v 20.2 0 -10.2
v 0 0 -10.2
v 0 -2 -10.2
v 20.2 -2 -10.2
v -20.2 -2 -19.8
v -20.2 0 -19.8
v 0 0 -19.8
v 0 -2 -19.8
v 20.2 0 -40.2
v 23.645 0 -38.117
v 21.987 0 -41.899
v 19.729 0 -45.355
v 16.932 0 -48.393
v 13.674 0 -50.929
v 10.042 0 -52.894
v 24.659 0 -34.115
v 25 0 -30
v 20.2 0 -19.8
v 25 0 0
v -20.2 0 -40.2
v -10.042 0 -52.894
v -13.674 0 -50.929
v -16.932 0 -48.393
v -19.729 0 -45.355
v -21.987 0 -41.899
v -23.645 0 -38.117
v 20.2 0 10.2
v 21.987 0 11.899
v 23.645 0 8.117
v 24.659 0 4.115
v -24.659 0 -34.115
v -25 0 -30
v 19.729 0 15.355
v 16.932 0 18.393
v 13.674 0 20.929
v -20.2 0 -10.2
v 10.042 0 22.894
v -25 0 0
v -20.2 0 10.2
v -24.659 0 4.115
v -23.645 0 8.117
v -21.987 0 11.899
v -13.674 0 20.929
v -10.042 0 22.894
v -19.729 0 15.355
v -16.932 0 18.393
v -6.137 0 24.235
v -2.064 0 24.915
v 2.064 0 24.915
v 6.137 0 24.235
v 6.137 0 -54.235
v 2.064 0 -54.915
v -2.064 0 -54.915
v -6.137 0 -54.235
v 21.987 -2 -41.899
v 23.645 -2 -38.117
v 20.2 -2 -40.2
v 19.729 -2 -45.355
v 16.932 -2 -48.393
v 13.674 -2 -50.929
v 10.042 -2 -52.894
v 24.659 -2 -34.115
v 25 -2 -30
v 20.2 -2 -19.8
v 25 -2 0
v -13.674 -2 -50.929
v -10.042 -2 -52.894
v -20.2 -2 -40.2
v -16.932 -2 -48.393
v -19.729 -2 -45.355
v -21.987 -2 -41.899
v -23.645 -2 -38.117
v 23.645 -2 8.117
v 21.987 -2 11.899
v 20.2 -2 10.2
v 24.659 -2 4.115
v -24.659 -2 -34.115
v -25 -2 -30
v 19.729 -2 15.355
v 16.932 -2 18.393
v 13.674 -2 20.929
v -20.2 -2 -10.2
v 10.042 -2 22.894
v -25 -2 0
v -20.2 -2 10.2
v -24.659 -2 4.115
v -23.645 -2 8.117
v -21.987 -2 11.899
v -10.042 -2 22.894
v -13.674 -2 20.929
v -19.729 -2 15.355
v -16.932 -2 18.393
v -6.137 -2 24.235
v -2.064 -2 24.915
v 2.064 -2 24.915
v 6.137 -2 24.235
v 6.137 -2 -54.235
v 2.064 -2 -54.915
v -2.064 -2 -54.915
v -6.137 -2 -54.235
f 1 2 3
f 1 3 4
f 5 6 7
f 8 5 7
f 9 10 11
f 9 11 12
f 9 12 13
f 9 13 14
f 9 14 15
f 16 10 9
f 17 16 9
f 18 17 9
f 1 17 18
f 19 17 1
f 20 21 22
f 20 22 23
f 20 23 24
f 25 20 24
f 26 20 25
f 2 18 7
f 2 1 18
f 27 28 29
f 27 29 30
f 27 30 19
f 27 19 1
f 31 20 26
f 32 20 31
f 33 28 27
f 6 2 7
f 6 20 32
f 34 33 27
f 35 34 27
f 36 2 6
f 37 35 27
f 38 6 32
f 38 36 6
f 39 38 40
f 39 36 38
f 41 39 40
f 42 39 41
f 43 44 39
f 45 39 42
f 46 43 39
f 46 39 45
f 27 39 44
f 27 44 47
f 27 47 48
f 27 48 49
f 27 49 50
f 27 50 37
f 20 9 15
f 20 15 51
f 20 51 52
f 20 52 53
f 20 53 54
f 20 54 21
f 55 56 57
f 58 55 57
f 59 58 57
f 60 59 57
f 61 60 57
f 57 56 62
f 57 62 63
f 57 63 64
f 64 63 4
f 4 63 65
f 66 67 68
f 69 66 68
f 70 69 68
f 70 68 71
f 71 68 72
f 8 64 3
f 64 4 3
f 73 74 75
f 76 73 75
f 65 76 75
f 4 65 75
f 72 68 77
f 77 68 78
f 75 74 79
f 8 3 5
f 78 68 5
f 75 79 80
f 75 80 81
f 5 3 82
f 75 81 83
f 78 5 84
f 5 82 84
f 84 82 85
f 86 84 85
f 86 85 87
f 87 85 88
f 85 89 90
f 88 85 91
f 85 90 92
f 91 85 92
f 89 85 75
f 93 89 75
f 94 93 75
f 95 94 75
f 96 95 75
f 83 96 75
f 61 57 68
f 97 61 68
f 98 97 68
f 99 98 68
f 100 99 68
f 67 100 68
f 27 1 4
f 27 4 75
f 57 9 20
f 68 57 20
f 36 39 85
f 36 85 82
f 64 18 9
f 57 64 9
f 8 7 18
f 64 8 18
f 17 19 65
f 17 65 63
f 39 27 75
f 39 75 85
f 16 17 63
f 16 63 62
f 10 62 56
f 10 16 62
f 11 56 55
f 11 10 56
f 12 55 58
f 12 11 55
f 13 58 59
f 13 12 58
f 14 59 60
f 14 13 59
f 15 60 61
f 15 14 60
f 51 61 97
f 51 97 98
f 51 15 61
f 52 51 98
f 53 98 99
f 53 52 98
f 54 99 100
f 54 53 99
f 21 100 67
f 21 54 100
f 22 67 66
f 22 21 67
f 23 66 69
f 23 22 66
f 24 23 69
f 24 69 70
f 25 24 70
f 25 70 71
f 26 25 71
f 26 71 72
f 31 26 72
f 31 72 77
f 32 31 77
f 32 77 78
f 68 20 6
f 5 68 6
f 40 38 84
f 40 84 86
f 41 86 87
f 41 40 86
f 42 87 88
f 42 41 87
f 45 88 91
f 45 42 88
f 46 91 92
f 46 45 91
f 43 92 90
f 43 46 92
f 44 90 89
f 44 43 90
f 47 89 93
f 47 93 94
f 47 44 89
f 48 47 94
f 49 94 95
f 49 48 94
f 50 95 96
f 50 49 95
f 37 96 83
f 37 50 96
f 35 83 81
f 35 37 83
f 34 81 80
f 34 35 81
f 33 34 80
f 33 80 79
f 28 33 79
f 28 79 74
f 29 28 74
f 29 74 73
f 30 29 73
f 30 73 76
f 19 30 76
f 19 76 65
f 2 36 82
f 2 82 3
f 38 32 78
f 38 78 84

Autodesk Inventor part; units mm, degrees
ref_plane "YZ Plane" through (0, 0, 0) normal (1, 0, 0) x (0, 1, 0)
ref_plane "XZ Plane" through (0, 0, 0) normal (0, 1, 0) x (-1, 0, 0)
ref_plane "XY Plane" through (0, 0, 0) normal (0, 0, 1) x (1, 0, 0)
sketch "Szkic1" plane through (0, 0, 0) normal (0, 1, 0) x (-1, 0, 0)
  line L0 (0, 0) -> (0, -30)
  circle A0 centre (0, 0) radius 2
  circle A1 centre (0, -30) radius 2
  line L1 (0, 0) -> (0, -30) construction
  line L2 (-25, 0) -> (-25, -30)
  line L3 (25, -30) -> (25, 0)
  arc A2 (25, 0) -> (-25, 0) centre (0, 0) ccw
  arc A3 (-25, -30) -> (25, -30) centre (0, -30) ccw
  line L4 (-20.2, -40.2) -> (20.2, -40.2)
  line L5 (20.2, -40.2) -> (20.2, -19.8)
  line L6 (20.2, -19.8) -> (-20.2, -19.8)
  line L7 (-20.2, -19.8) -> (-20.2, -40.2)
  line L8 (-20.2, -40.2) -> (20.2, -19.8) construction
  line L9 (20.2, -40.2) -> (-20.2, -19.8) construction
  line L10 (0, -15) -> (-25, -15) construction
  line L11 (0, -30) -> (0, 0)
  circle A4 centre (0, 0) radius 2
  line L12 (0, -30) -> (0, 0) construction
  line L13 (-20.2, 10.2) -> (20.2, 10.2)
  line L14 (20.2, 10.2) -> (20.2, -10.2)
  line L15 (20.2, -10.2) -> (-20.2, -10.2)
  line L16 (-20.2, 10.2) -> (20.2, -10.2) construction
  line L17 (20.2, 10.2) -> (-20.2, -10.2) construction
  line L18 (-20.2, -10.2) -> (-20.2, 10.2)
  line L19 (0, -15) -> (-400, -15) construction
  line L20 (0, -15) -> (400, -15) construction
  dimension "d0" = 30
  dimension "d1" = 4
  dimension "d2" = 4
  dimension "d3" = 50
  dimension "d6" = 40.4
  dimension "d7" = 20.4
  dimension "d8" = 400
  dimension "d9" = 180
extrude "Wyciągnięcie proste1" add sketch "Szkic1" against normal blind 2 contours A2 L3 A3 L2
properties part number "base"
